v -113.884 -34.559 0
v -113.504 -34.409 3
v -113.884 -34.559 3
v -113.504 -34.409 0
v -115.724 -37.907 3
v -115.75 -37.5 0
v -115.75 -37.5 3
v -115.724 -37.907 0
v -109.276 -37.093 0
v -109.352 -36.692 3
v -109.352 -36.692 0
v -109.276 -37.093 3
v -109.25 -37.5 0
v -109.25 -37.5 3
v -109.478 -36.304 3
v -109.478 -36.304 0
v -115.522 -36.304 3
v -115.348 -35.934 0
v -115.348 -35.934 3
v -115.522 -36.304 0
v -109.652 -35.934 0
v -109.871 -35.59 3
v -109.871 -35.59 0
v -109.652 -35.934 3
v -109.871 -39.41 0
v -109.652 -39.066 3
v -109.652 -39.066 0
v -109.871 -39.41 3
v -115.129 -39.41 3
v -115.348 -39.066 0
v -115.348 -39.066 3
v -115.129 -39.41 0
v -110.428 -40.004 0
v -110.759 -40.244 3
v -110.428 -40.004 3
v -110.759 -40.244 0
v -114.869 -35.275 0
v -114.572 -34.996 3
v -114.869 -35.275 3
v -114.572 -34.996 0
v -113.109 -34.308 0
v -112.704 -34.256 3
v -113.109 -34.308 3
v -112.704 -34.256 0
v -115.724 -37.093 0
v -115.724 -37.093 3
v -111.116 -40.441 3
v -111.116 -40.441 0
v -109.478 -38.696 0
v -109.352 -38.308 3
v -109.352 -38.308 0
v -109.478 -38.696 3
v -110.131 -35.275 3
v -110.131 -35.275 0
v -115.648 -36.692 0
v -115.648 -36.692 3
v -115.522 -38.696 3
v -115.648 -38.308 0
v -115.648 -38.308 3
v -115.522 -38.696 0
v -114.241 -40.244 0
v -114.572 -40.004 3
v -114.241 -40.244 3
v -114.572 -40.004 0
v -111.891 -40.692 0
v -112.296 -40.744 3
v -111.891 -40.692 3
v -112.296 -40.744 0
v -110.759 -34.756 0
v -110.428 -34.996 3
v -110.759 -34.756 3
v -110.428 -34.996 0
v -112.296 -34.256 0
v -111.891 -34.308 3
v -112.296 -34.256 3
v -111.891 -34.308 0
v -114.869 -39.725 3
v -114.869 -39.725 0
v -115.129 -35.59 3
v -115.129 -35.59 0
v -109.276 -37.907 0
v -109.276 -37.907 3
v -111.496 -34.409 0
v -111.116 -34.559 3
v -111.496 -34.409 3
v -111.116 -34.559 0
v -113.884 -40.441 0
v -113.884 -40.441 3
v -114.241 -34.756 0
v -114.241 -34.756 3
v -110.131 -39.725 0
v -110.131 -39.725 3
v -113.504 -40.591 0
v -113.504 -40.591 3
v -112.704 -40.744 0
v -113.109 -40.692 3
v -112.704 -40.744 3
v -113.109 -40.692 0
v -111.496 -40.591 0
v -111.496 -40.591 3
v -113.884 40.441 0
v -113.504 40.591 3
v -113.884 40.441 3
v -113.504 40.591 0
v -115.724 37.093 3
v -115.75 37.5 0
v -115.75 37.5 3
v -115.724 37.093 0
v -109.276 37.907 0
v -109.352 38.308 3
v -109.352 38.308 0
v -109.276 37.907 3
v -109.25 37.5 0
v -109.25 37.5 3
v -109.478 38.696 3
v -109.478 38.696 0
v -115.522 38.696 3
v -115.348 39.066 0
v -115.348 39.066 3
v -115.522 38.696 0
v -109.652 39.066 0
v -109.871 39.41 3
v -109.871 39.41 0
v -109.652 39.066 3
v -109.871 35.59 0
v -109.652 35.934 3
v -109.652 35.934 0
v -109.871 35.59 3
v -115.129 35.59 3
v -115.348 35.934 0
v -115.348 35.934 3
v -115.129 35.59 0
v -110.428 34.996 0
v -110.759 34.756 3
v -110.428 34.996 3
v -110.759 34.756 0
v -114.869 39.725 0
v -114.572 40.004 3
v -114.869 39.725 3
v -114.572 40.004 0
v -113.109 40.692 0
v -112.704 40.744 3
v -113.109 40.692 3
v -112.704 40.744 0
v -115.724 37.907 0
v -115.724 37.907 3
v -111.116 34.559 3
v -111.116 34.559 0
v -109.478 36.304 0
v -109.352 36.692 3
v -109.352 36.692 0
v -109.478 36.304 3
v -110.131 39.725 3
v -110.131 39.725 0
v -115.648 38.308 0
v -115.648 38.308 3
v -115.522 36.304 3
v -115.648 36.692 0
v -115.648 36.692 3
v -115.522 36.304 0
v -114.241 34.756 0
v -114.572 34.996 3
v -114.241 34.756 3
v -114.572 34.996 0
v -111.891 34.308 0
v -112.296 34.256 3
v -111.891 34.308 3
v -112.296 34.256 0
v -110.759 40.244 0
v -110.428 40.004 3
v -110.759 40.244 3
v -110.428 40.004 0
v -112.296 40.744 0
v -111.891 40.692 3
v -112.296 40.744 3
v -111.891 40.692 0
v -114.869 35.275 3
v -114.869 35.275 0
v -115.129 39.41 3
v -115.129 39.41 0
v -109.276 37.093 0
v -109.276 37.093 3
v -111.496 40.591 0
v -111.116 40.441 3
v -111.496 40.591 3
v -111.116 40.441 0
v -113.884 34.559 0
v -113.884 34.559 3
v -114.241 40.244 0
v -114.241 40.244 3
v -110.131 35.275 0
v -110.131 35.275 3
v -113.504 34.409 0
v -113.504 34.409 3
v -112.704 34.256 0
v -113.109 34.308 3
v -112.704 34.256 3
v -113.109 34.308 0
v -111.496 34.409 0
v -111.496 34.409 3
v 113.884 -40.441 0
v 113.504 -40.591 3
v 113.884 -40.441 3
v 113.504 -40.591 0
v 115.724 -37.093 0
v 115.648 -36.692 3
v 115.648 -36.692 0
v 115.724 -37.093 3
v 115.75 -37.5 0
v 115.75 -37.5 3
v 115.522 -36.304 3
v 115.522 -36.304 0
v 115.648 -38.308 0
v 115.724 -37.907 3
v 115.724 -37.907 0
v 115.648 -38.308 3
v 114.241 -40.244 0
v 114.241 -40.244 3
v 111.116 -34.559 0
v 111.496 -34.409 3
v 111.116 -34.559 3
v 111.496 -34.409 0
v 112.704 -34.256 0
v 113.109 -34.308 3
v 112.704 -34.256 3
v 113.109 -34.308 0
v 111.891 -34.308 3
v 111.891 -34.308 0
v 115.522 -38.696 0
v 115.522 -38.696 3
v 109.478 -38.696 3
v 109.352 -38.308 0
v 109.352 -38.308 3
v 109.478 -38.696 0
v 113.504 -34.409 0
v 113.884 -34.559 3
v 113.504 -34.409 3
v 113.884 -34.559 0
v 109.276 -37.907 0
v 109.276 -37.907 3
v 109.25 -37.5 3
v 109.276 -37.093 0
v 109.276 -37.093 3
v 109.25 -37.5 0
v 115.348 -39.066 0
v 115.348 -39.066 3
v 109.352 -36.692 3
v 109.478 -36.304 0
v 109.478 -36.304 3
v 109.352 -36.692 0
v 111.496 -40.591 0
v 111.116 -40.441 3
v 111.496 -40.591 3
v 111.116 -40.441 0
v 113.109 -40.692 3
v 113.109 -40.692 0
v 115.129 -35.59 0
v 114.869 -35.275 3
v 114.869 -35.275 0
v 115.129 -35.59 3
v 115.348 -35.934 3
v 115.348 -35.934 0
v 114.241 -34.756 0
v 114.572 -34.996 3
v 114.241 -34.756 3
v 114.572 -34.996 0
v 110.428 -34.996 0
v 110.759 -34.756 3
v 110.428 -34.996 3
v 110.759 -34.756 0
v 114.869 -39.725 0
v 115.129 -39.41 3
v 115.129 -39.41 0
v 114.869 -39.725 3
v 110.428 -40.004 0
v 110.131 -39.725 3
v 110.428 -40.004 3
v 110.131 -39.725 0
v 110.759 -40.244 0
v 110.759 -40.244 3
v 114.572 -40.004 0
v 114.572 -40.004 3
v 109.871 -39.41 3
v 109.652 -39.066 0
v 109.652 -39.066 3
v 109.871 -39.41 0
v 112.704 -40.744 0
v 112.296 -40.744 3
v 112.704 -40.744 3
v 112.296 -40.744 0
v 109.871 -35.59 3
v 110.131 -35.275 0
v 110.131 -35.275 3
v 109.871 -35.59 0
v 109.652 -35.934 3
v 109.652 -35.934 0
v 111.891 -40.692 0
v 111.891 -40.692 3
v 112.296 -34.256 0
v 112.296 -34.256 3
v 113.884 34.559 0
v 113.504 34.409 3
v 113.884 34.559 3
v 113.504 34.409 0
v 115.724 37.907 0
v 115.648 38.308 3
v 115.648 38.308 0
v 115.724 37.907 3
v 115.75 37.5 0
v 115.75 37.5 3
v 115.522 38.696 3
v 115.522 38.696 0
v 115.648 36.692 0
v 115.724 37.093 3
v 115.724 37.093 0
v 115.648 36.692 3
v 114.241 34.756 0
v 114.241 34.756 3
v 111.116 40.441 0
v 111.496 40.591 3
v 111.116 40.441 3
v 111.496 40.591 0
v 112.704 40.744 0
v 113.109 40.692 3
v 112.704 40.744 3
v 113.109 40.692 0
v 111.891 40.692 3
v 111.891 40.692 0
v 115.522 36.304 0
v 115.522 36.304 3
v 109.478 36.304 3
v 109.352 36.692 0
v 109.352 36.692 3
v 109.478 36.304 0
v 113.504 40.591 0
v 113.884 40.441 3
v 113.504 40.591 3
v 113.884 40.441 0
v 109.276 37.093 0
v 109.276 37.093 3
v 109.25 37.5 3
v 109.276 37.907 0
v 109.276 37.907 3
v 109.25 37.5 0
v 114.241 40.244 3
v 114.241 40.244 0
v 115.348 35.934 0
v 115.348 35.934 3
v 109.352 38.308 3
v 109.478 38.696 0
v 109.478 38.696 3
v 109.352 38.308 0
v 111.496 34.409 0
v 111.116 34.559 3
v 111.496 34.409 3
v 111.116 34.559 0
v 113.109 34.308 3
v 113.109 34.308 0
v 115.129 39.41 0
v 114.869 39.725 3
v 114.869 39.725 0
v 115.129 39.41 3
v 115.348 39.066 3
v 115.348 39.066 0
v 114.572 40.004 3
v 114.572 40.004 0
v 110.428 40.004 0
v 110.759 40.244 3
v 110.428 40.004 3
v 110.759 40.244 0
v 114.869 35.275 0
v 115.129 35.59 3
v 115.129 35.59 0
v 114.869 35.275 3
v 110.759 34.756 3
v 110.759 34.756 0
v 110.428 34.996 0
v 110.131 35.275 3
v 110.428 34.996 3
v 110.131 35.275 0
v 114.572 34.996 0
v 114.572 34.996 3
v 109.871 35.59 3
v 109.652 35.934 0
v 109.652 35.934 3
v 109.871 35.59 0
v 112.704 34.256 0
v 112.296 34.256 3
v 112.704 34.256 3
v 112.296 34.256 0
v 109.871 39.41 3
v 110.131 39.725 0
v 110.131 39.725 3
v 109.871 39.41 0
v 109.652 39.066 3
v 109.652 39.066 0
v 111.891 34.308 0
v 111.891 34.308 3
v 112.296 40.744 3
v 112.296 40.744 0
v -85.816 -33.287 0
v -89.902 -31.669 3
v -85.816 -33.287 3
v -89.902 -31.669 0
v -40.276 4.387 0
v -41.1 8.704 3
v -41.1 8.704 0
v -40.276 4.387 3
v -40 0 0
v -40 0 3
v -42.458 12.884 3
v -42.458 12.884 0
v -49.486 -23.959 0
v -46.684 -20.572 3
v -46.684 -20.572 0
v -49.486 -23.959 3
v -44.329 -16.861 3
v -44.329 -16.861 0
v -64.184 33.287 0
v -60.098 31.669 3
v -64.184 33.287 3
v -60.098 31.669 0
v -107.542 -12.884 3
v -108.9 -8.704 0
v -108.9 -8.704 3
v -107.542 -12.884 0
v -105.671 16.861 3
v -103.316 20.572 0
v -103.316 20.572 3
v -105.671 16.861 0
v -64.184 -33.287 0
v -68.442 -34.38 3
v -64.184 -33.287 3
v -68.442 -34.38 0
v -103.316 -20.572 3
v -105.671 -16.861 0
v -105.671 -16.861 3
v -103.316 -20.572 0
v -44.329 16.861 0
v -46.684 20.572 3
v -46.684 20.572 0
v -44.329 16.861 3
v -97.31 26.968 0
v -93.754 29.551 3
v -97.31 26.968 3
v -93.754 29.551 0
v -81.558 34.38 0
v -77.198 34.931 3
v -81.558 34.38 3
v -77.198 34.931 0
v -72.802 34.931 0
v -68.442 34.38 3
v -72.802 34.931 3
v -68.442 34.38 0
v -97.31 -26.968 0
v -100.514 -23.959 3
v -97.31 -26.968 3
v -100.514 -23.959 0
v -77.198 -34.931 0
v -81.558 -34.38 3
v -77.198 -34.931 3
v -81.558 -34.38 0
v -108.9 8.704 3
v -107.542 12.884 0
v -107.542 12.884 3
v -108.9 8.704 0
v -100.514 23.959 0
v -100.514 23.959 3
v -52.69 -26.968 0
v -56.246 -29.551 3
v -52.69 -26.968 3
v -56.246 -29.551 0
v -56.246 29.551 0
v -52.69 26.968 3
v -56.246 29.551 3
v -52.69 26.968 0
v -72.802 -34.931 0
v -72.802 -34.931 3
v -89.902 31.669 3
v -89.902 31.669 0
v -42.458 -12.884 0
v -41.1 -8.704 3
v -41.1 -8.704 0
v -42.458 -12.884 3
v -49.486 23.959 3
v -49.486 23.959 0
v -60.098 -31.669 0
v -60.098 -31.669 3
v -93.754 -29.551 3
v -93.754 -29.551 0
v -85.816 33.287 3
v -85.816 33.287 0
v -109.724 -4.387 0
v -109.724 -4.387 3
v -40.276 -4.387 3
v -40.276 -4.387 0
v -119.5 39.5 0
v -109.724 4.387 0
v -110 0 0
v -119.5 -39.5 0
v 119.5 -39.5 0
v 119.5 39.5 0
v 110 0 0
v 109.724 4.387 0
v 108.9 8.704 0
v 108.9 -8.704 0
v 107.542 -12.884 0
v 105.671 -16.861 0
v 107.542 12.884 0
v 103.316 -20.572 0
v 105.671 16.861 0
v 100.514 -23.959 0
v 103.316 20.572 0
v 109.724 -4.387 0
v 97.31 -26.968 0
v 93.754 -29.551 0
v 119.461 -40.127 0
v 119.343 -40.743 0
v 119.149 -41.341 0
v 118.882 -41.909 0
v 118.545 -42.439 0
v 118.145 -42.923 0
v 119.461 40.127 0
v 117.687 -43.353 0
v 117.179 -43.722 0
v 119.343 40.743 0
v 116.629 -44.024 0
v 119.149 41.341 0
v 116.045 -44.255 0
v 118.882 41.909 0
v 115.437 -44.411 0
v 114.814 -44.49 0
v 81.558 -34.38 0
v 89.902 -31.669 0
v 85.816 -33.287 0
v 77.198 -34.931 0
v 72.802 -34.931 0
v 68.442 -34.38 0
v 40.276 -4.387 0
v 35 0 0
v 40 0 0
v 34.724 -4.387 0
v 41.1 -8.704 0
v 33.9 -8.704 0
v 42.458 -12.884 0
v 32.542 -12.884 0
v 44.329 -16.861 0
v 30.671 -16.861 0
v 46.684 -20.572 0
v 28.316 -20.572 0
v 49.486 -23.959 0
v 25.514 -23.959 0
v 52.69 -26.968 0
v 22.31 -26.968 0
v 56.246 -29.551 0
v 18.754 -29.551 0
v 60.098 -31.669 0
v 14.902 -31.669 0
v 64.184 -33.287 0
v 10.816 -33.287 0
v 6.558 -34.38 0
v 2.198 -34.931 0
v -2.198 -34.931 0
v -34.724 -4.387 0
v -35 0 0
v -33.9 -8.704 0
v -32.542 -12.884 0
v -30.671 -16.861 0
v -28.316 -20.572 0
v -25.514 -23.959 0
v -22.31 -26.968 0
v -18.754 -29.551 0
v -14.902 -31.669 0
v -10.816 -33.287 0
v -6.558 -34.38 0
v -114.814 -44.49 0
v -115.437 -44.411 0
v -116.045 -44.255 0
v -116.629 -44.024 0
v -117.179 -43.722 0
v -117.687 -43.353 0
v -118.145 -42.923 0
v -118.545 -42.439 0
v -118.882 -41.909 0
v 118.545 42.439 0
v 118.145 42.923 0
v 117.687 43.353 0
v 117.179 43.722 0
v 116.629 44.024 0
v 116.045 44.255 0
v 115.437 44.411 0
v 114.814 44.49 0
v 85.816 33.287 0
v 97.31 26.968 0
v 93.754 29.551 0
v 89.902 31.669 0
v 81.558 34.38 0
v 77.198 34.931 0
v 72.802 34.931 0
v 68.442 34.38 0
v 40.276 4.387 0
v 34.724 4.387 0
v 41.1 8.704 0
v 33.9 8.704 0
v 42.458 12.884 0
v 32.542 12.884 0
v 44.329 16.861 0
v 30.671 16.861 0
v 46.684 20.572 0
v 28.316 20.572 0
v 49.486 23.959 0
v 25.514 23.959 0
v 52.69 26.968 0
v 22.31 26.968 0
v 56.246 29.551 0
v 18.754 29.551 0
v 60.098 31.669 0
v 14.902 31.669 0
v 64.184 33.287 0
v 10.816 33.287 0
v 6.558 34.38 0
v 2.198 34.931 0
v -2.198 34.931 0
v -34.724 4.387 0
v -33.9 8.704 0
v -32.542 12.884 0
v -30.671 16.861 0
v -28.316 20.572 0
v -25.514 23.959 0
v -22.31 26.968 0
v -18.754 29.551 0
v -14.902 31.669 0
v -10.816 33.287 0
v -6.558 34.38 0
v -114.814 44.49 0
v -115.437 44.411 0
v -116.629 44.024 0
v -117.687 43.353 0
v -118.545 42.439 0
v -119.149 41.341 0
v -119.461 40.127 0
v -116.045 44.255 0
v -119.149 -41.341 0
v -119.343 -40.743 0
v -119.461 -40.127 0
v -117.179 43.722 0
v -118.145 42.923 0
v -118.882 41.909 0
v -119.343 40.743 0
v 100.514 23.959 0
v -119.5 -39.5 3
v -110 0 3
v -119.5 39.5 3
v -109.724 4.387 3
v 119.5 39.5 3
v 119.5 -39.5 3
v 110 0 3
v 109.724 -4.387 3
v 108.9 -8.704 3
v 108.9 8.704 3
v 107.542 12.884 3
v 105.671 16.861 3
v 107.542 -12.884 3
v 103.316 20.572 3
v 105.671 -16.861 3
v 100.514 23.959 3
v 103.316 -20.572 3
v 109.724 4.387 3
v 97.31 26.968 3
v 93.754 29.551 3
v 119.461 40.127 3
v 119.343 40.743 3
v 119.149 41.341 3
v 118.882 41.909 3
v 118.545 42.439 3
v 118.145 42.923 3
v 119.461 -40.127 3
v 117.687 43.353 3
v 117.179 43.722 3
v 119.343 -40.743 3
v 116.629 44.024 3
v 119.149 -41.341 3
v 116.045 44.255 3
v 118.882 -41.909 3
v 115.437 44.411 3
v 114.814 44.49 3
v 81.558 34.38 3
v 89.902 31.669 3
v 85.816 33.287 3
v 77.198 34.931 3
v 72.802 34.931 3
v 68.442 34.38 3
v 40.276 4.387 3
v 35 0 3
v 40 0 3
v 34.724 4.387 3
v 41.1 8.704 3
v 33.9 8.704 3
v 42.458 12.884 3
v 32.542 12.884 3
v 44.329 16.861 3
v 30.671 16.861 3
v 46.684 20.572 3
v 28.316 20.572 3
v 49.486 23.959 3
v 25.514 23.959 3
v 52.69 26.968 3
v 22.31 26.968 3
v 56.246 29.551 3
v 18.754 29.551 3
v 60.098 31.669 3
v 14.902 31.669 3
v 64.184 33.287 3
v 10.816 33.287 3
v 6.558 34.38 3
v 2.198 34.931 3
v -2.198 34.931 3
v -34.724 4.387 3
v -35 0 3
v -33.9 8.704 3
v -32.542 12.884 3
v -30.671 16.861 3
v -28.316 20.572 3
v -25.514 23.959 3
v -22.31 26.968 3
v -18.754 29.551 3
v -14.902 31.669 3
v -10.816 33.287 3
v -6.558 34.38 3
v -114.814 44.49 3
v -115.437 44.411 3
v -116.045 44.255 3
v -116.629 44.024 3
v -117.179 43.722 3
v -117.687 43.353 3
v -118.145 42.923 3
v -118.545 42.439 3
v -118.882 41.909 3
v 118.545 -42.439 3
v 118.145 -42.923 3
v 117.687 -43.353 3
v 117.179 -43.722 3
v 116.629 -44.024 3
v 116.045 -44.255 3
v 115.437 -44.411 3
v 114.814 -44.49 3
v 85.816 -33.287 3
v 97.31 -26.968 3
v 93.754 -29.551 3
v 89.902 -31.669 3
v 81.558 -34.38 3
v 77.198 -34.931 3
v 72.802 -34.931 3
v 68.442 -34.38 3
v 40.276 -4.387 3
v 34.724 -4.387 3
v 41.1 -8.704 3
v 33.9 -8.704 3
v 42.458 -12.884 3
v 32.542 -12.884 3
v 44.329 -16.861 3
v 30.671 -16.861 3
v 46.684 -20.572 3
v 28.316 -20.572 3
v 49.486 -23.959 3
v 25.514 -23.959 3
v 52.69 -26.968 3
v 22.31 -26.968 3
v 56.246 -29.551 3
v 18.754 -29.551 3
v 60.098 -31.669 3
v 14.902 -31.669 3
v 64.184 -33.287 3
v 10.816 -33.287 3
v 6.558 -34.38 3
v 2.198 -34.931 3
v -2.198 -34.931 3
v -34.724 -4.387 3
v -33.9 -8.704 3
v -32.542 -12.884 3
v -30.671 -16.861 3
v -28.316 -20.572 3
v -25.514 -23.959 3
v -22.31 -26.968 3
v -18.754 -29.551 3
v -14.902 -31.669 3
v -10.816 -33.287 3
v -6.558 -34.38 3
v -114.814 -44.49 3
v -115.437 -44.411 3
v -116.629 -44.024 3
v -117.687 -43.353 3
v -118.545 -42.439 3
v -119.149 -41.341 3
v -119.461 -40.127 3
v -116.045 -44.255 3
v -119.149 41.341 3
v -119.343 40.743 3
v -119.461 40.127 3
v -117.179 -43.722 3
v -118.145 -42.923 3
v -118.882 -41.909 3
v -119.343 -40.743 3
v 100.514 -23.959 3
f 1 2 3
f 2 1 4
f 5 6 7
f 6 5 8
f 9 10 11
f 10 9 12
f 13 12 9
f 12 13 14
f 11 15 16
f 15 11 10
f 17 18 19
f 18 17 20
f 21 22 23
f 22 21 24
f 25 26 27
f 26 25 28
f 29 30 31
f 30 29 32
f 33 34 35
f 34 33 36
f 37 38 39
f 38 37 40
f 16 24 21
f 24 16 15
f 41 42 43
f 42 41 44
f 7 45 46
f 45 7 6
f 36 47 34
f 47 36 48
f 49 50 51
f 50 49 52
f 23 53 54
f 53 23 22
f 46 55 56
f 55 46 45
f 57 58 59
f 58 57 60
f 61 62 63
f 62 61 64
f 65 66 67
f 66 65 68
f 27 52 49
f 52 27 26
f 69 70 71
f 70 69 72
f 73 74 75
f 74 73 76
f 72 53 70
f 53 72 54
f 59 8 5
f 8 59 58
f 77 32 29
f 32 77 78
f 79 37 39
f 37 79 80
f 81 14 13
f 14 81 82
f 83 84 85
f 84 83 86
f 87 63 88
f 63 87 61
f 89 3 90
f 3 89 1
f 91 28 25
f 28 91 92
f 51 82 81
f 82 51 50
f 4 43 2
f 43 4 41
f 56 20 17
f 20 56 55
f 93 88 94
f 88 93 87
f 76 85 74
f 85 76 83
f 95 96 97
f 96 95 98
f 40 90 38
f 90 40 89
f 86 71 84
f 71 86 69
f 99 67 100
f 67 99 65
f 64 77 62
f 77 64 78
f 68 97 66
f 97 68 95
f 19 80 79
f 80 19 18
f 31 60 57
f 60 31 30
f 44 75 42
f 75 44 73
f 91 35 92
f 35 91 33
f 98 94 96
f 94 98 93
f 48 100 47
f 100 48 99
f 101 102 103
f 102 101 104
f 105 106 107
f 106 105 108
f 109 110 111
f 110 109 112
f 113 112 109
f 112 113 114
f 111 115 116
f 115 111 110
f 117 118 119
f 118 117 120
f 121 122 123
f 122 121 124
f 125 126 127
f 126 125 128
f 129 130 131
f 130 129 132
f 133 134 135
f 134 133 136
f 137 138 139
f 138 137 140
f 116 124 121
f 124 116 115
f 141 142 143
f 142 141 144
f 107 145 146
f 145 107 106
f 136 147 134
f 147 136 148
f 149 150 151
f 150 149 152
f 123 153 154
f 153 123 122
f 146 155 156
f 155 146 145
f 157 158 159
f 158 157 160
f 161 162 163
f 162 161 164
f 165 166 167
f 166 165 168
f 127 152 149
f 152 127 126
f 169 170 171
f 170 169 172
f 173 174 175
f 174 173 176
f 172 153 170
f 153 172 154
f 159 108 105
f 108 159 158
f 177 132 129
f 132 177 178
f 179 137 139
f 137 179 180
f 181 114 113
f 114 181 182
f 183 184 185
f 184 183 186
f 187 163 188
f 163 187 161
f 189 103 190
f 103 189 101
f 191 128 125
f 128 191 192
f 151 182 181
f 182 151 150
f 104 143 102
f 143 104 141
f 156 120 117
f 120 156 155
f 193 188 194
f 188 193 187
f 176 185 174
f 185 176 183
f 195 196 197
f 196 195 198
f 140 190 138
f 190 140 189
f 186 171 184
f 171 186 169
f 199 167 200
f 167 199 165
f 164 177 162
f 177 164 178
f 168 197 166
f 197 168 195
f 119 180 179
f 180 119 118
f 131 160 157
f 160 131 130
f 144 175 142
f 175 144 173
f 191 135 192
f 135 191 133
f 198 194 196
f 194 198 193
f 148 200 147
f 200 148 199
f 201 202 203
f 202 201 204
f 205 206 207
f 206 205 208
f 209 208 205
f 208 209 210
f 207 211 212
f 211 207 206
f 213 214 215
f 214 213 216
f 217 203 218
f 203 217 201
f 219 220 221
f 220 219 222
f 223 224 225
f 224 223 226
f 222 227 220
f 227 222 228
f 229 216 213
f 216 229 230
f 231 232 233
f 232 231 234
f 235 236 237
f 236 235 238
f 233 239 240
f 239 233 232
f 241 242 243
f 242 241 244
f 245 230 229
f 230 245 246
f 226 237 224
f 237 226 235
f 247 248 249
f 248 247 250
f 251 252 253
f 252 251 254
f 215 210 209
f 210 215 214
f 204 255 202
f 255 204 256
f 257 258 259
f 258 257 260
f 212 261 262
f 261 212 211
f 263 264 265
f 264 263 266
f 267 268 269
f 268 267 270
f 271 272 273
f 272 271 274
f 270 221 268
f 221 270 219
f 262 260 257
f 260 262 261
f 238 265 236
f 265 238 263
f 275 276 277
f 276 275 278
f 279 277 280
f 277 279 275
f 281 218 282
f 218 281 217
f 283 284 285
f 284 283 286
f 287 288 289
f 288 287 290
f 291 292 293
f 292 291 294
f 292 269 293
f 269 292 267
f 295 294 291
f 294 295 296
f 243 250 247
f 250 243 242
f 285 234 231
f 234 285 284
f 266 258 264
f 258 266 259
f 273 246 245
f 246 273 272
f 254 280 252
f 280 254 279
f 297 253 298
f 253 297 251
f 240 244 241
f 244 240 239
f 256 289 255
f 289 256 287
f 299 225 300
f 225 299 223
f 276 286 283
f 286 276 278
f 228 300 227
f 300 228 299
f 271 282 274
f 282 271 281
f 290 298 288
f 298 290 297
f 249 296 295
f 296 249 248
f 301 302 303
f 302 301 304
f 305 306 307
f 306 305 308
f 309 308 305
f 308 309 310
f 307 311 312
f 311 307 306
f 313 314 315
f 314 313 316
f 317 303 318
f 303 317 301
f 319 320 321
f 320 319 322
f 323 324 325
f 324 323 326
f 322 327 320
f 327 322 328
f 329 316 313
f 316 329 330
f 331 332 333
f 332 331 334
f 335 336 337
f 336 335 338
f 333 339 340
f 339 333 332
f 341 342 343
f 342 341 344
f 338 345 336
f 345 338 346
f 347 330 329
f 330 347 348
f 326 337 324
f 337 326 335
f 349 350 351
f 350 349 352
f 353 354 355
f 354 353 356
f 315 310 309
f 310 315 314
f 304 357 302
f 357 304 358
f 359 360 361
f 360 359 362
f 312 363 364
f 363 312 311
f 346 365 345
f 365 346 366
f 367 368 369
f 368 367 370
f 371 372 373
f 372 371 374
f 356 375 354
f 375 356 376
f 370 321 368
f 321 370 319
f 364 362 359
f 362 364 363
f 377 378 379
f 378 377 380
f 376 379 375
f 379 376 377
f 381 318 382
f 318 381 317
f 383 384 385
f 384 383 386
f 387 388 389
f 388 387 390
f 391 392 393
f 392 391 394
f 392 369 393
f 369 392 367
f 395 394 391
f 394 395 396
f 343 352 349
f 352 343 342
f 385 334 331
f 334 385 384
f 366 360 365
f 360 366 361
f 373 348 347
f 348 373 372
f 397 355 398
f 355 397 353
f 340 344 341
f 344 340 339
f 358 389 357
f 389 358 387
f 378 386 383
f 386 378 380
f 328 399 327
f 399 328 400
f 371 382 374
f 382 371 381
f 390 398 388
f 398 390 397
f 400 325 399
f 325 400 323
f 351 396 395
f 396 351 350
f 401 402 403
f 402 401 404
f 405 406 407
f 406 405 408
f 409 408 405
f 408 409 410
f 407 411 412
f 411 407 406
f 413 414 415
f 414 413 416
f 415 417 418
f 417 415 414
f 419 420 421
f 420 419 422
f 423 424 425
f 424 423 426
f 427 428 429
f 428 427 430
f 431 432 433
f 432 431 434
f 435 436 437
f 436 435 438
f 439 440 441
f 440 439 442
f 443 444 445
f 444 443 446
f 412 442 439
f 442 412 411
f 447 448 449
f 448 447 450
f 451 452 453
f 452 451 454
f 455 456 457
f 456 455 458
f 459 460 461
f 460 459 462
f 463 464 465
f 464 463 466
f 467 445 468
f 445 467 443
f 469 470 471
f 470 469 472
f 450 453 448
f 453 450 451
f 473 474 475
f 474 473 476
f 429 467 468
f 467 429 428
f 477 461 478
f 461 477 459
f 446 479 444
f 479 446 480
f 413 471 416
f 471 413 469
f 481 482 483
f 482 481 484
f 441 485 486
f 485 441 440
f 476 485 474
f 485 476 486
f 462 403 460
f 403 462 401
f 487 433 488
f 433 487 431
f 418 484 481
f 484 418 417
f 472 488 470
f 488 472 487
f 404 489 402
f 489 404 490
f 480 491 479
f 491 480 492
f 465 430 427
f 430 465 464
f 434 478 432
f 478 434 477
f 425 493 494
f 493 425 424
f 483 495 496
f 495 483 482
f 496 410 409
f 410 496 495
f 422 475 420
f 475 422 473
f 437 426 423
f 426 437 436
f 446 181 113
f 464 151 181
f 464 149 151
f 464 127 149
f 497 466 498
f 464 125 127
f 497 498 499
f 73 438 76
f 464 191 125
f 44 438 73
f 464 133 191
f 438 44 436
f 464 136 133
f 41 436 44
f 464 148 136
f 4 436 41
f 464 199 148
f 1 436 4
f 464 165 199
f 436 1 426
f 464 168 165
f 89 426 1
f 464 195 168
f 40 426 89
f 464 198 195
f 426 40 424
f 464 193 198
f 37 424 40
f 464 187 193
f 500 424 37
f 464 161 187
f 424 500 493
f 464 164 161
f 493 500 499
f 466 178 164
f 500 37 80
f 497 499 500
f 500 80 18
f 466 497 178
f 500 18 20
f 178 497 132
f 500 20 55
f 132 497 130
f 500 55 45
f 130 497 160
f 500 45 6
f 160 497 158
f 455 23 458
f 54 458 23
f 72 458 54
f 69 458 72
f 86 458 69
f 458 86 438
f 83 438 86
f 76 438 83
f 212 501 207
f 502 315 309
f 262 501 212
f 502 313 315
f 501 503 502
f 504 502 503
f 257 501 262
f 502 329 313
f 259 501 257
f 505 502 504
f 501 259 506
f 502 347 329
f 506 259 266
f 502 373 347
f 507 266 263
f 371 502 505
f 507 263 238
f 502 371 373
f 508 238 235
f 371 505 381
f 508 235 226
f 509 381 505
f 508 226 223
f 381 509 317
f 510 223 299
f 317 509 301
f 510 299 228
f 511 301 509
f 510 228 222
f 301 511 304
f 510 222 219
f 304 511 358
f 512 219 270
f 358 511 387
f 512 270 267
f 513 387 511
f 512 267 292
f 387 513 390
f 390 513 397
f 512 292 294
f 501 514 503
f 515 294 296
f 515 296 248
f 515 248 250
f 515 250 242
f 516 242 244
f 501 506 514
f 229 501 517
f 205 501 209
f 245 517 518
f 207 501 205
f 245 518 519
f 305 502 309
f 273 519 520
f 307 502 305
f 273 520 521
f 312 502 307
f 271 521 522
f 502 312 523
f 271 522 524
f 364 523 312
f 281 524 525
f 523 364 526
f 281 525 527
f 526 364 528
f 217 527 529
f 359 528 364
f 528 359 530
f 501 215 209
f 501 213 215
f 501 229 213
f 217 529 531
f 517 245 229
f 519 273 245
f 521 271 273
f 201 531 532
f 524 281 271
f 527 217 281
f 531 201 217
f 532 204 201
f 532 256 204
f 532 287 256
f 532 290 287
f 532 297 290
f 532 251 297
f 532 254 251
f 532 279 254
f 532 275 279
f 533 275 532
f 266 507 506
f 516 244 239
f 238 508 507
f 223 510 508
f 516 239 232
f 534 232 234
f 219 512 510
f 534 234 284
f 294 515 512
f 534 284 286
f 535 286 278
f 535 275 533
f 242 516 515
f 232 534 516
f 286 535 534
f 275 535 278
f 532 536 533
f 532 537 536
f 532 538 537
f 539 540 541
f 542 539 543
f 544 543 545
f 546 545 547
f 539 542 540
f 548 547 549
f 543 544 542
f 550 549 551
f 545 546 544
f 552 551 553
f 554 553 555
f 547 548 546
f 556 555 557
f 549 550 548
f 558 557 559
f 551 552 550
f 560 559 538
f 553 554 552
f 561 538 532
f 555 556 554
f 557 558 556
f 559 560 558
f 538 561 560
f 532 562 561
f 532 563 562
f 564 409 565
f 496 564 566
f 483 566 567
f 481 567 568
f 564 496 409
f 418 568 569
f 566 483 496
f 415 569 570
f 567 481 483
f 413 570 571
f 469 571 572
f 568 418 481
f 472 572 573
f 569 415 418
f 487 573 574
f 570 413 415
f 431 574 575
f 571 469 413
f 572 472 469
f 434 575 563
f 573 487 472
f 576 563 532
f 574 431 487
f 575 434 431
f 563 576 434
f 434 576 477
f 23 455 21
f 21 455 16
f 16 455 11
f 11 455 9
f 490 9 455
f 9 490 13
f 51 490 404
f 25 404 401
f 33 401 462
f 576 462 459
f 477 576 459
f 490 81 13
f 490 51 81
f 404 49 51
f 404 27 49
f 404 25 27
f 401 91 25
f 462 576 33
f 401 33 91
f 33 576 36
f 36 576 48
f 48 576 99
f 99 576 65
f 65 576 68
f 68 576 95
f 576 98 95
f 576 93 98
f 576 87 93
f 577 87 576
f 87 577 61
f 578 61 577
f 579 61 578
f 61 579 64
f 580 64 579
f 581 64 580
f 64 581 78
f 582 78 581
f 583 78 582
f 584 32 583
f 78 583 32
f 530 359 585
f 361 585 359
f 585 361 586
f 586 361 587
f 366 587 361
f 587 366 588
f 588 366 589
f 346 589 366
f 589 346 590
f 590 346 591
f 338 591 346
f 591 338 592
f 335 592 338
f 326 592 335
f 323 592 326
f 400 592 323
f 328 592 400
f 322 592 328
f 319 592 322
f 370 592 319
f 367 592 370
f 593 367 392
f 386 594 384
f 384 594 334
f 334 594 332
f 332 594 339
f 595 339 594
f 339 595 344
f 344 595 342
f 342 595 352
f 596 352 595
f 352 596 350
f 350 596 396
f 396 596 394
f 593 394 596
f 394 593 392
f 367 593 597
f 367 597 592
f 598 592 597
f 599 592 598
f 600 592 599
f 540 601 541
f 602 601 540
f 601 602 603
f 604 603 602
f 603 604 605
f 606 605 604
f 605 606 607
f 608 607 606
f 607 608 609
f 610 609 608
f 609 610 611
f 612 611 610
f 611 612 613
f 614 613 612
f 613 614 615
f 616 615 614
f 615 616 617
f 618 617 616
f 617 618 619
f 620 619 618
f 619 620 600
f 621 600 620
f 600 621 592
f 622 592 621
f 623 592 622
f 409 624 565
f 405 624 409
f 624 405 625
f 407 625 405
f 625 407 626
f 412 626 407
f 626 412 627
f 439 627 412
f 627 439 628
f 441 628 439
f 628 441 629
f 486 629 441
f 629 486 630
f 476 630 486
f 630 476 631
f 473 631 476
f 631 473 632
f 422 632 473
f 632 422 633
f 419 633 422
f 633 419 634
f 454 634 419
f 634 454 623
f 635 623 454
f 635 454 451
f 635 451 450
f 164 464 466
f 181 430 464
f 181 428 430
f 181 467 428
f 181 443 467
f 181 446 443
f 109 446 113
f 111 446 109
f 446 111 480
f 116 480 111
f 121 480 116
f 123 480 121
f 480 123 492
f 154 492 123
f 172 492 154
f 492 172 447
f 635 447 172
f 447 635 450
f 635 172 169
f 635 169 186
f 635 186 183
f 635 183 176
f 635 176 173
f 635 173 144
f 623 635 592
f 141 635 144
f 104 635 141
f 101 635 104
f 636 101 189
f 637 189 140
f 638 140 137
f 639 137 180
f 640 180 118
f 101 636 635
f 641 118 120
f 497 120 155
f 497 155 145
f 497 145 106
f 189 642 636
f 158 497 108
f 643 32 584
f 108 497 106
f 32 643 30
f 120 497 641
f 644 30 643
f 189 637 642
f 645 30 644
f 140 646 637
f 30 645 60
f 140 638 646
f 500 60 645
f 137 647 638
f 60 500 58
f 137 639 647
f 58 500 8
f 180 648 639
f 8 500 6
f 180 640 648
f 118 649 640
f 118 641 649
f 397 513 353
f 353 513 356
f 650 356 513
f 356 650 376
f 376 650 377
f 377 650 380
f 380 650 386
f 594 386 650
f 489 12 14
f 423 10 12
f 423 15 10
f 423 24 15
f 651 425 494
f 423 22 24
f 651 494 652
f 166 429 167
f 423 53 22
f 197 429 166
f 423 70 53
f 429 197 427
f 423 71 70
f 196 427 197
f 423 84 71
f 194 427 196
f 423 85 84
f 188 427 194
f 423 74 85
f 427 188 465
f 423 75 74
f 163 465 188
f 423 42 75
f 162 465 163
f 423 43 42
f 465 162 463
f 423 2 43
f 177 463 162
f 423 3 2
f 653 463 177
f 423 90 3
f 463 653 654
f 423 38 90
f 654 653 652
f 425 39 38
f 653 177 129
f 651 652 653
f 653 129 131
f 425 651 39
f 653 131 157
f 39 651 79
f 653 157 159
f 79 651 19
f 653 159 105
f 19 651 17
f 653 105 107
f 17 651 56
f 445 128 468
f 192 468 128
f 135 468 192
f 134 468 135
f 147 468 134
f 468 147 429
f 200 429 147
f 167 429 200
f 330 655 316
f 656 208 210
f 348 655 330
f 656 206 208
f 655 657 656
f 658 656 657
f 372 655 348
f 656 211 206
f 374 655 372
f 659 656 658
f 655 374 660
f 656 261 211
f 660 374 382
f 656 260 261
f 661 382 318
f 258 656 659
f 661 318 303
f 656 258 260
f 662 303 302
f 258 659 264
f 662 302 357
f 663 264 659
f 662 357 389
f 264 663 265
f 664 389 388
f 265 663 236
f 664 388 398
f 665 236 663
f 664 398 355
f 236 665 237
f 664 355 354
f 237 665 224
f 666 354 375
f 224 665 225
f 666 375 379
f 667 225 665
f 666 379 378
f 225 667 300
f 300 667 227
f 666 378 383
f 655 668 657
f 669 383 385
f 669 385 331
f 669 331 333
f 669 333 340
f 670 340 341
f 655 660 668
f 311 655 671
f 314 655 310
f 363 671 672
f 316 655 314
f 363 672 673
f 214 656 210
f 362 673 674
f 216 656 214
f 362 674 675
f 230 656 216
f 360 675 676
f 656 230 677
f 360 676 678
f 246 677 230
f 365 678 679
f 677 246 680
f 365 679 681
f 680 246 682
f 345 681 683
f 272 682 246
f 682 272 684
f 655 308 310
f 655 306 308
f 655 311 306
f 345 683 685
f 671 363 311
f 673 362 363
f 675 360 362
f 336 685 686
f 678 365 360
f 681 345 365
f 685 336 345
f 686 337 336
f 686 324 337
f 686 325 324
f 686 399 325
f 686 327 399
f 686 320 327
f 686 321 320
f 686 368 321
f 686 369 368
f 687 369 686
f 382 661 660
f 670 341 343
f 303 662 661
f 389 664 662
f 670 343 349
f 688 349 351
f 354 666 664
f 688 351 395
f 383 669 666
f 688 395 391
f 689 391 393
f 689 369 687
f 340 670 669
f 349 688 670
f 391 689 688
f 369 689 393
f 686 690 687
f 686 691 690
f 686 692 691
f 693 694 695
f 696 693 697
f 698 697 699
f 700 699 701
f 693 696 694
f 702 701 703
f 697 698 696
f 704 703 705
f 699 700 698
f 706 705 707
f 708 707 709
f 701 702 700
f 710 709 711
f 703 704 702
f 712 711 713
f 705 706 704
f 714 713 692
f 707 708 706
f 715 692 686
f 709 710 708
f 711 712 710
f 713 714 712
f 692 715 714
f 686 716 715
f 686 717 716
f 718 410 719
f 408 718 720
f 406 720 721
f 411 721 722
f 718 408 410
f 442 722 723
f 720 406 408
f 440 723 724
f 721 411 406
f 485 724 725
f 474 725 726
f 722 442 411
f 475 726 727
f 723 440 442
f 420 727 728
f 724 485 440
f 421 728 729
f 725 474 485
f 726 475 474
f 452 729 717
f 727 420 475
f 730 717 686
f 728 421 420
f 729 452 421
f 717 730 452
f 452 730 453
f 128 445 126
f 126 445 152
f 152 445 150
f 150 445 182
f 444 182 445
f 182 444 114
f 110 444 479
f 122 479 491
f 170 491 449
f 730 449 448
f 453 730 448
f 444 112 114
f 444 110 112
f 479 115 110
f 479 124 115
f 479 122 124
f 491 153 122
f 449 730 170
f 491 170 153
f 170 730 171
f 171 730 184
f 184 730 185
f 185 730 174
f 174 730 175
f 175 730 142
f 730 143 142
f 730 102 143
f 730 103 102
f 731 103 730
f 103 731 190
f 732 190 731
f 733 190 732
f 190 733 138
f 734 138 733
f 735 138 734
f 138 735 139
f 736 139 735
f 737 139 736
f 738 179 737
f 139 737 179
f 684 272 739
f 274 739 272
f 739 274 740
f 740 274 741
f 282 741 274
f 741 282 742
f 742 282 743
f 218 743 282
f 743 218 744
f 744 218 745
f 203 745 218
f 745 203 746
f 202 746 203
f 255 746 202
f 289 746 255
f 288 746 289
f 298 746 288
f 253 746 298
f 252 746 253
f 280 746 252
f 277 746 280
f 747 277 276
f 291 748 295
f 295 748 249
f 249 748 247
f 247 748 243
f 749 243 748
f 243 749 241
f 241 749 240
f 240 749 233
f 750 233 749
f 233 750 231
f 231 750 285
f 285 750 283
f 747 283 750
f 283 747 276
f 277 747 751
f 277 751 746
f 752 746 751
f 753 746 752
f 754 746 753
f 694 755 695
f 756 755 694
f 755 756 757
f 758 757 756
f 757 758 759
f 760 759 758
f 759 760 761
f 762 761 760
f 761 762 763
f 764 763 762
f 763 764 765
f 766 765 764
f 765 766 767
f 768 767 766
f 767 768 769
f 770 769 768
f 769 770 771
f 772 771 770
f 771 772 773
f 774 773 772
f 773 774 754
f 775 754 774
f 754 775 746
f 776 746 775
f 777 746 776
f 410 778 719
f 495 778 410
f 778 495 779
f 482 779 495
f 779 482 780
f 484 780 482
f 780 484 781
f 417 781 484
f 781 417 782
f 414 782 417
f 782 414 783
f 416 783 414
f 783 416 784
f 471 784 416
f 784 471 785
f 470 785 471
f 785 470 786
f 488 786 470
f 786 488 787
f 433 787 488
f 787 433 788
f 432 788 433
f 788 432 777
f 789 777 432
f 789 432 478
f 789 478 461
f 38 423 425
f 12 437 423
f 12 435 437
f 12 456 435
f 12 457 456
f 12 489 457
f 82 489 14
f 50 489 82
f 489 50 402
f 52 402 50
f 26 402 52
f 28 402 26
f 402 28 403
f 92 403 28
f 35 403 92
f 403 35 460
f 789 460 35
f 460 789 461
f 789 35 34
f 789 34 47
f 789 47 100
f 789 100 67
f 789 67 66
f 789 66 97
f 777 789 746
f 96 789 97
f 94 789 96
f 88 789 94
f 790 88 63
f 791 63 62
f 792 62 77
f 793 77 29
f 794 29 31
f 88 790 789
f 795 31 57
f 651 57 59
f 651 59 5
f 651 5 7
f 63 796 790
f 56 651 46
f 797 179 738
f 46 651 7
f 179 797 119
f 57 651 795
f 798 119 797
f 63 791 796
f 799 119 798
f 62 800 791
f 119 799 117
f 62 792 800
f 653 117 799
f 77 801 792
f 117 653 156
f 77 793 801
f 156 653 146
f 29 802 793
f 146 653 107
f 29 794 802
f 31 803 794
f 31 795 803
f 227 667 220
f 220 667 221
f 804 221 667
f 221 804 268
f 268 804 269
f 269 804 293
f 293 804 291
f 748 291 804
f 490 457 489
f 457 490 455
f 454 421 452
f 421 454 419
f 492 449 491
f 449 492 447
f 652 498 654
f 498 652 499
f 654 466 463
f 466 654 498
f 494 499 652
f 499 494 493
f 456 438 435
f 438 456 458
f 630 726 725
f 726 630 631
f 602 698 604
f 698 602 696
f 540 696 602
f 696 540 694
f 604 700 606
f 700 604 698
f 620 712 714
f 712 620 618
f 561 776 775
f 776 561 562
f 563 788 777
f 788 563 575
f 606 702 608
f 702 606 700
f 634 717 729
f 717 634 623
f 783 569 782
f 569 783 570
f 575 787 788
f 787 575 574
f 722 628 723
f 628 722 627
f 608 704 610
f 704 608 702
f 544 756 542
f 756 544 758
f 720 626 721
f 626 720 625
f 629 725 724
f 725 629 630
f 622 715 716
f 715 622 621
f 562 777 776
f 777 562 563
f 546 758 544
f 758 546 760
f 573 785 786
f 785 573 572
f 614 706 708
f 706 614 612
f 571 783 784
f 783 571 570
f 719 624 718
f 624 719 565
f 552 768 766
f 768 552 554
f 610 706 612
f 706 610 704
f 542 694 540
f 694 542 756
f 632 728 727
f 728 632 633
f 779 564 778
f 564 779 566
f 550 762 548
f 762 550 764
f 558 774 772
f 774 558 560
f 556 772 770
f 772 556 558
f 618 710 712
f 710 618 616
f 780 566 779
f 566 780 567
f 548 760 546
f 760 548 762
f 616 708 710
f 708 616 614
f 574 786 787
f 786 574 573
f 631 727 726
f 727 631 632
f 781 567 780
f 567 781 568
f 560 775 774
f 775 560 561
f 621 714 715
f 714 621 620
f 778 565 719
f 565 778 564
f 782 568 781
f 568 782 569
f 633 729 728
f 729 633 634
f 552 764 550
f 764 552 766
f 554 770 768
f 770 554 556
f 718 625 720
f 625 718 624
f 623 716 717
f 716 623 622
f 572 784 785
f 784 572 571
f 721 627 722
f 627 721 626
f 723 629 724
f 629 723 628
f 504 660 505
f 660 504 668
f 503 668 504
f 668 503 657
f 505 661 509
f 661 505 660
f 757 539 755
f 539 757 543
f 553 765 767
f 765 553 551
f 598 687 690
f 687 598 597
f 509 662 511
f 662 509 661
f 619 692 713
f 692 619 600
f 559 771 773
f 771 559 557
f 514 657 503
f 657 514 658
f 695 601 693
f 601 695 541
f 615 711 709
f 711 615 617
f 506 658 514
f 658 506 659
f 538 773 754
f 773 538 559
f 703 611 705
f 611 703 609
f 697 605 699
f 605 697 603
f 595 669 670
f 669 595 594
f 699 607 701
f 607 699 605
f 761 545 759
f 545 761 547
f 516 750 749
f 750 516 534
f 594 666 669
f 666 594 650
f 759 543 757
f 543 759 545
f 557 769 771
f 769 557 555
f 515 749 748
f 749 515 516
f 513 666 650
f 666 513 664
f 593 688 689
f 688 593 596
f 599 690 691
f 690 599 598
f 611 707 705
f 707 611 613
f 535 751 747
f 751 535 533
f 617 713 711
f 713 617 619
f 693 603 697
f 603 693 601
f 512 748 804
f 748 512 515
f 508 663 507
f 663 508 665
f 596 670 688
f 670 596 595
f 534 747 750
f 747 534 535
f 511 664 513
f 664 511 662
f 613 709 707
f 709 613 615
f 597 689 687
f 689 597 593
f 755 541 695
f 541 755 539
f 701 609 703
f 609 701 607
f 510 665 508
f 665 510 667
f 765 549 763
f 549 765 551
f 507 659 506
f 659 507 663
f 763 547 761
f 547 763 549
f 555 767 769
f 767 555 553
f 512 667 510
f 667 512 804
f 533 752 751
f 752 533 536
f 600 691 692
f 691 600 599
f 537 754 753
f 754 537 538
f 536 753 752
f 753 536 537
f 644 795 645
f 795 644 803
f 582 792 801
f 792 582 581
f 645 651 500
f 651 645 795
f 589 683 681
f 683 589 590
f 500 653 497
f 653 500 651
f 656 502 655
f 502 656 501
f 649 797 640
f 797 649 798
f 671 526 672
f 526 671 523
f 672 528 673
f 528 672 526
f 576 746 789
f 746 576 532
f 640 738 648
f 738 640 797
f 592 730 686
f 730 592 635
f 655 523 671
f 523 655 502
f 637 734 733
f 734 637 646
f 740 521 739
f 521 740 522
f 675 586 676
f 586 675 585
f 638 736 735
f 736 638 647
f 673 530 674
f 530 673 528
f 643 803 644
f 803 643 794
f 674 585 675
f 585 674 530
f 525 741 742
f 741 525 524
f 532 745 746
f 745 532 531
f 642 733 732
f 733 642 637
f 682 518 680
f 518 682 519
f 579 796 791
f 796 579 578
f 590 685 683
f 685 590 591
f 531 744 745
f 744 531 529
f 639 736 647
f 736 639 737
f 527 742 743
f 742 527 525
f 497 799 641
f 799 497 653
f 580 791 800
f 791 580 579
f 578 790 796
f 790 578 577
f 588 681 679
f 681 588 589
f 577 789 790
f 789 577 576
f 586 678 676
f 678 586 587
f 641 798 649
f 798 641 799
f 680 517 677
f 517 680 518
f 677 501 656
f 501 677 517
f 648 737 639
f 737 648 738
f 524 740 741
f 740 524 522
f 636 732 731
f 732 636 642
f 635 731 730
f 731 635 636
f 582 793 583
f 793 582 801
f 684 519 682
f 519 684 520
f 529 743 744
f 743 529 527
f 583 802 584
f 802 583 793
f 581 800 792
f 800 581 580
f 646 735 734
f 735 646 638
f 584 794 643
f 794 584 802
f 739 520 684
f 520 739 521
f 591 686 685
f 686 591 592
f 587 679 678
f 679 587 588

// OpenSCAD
$fn = 50;


difference() {
	union() {
		hull() {
			translate(v = [-114.5000000000, 39.5000000000, 0]) {
				cylinder(h = 3, r = 5);
			}
			translate(v = [114.5000000000, 39.5000000000, 0]) {
				cylinder(h = 3, r = 5);
			}
			translate(v = [-114.5000000000, -39.5000000000, 0]) {
				cylinder(h = 3, r = 5);
			}
			translate(v = [114.5000000000, -39.5000000000, 0]) {
				cylinder(h = 3, r = 5);
			}
		}
	}
	union() {
		#translate(v = [-112.5000000000, -37.5000000000, -100.0000000000]) {
			cylinder(h = 200, r = 3.2500000000);
		}
		#translate(v = [-112.5000000000, 37.5000000000, -100.0000000000]) {
			cylinder(h = 200, r = 3.2500000000);
		}
		#translate(v = [112.5000000000, -37.5000000000, -100.0000000000]) {
			cylinder(h = 200, r = 3.2500000000);
		}
		#translate(v = [112.5000000000, 37.5000000000, -100.0000000000]) {
			cylinder(h = 200, r = 3.2500000000);
		}
		#translate(v = [-75.0000000000, 0, 0]) {
			cylinder(h = 3, r = 35.0000000000);
		}
		#cylinder(h = 3, r = 35.0000000000);
		#translate(v = [75.0000000000, 0, 0]) {
			cylinder(h = 3, r = 35.0000000000);
		}
	}
}
